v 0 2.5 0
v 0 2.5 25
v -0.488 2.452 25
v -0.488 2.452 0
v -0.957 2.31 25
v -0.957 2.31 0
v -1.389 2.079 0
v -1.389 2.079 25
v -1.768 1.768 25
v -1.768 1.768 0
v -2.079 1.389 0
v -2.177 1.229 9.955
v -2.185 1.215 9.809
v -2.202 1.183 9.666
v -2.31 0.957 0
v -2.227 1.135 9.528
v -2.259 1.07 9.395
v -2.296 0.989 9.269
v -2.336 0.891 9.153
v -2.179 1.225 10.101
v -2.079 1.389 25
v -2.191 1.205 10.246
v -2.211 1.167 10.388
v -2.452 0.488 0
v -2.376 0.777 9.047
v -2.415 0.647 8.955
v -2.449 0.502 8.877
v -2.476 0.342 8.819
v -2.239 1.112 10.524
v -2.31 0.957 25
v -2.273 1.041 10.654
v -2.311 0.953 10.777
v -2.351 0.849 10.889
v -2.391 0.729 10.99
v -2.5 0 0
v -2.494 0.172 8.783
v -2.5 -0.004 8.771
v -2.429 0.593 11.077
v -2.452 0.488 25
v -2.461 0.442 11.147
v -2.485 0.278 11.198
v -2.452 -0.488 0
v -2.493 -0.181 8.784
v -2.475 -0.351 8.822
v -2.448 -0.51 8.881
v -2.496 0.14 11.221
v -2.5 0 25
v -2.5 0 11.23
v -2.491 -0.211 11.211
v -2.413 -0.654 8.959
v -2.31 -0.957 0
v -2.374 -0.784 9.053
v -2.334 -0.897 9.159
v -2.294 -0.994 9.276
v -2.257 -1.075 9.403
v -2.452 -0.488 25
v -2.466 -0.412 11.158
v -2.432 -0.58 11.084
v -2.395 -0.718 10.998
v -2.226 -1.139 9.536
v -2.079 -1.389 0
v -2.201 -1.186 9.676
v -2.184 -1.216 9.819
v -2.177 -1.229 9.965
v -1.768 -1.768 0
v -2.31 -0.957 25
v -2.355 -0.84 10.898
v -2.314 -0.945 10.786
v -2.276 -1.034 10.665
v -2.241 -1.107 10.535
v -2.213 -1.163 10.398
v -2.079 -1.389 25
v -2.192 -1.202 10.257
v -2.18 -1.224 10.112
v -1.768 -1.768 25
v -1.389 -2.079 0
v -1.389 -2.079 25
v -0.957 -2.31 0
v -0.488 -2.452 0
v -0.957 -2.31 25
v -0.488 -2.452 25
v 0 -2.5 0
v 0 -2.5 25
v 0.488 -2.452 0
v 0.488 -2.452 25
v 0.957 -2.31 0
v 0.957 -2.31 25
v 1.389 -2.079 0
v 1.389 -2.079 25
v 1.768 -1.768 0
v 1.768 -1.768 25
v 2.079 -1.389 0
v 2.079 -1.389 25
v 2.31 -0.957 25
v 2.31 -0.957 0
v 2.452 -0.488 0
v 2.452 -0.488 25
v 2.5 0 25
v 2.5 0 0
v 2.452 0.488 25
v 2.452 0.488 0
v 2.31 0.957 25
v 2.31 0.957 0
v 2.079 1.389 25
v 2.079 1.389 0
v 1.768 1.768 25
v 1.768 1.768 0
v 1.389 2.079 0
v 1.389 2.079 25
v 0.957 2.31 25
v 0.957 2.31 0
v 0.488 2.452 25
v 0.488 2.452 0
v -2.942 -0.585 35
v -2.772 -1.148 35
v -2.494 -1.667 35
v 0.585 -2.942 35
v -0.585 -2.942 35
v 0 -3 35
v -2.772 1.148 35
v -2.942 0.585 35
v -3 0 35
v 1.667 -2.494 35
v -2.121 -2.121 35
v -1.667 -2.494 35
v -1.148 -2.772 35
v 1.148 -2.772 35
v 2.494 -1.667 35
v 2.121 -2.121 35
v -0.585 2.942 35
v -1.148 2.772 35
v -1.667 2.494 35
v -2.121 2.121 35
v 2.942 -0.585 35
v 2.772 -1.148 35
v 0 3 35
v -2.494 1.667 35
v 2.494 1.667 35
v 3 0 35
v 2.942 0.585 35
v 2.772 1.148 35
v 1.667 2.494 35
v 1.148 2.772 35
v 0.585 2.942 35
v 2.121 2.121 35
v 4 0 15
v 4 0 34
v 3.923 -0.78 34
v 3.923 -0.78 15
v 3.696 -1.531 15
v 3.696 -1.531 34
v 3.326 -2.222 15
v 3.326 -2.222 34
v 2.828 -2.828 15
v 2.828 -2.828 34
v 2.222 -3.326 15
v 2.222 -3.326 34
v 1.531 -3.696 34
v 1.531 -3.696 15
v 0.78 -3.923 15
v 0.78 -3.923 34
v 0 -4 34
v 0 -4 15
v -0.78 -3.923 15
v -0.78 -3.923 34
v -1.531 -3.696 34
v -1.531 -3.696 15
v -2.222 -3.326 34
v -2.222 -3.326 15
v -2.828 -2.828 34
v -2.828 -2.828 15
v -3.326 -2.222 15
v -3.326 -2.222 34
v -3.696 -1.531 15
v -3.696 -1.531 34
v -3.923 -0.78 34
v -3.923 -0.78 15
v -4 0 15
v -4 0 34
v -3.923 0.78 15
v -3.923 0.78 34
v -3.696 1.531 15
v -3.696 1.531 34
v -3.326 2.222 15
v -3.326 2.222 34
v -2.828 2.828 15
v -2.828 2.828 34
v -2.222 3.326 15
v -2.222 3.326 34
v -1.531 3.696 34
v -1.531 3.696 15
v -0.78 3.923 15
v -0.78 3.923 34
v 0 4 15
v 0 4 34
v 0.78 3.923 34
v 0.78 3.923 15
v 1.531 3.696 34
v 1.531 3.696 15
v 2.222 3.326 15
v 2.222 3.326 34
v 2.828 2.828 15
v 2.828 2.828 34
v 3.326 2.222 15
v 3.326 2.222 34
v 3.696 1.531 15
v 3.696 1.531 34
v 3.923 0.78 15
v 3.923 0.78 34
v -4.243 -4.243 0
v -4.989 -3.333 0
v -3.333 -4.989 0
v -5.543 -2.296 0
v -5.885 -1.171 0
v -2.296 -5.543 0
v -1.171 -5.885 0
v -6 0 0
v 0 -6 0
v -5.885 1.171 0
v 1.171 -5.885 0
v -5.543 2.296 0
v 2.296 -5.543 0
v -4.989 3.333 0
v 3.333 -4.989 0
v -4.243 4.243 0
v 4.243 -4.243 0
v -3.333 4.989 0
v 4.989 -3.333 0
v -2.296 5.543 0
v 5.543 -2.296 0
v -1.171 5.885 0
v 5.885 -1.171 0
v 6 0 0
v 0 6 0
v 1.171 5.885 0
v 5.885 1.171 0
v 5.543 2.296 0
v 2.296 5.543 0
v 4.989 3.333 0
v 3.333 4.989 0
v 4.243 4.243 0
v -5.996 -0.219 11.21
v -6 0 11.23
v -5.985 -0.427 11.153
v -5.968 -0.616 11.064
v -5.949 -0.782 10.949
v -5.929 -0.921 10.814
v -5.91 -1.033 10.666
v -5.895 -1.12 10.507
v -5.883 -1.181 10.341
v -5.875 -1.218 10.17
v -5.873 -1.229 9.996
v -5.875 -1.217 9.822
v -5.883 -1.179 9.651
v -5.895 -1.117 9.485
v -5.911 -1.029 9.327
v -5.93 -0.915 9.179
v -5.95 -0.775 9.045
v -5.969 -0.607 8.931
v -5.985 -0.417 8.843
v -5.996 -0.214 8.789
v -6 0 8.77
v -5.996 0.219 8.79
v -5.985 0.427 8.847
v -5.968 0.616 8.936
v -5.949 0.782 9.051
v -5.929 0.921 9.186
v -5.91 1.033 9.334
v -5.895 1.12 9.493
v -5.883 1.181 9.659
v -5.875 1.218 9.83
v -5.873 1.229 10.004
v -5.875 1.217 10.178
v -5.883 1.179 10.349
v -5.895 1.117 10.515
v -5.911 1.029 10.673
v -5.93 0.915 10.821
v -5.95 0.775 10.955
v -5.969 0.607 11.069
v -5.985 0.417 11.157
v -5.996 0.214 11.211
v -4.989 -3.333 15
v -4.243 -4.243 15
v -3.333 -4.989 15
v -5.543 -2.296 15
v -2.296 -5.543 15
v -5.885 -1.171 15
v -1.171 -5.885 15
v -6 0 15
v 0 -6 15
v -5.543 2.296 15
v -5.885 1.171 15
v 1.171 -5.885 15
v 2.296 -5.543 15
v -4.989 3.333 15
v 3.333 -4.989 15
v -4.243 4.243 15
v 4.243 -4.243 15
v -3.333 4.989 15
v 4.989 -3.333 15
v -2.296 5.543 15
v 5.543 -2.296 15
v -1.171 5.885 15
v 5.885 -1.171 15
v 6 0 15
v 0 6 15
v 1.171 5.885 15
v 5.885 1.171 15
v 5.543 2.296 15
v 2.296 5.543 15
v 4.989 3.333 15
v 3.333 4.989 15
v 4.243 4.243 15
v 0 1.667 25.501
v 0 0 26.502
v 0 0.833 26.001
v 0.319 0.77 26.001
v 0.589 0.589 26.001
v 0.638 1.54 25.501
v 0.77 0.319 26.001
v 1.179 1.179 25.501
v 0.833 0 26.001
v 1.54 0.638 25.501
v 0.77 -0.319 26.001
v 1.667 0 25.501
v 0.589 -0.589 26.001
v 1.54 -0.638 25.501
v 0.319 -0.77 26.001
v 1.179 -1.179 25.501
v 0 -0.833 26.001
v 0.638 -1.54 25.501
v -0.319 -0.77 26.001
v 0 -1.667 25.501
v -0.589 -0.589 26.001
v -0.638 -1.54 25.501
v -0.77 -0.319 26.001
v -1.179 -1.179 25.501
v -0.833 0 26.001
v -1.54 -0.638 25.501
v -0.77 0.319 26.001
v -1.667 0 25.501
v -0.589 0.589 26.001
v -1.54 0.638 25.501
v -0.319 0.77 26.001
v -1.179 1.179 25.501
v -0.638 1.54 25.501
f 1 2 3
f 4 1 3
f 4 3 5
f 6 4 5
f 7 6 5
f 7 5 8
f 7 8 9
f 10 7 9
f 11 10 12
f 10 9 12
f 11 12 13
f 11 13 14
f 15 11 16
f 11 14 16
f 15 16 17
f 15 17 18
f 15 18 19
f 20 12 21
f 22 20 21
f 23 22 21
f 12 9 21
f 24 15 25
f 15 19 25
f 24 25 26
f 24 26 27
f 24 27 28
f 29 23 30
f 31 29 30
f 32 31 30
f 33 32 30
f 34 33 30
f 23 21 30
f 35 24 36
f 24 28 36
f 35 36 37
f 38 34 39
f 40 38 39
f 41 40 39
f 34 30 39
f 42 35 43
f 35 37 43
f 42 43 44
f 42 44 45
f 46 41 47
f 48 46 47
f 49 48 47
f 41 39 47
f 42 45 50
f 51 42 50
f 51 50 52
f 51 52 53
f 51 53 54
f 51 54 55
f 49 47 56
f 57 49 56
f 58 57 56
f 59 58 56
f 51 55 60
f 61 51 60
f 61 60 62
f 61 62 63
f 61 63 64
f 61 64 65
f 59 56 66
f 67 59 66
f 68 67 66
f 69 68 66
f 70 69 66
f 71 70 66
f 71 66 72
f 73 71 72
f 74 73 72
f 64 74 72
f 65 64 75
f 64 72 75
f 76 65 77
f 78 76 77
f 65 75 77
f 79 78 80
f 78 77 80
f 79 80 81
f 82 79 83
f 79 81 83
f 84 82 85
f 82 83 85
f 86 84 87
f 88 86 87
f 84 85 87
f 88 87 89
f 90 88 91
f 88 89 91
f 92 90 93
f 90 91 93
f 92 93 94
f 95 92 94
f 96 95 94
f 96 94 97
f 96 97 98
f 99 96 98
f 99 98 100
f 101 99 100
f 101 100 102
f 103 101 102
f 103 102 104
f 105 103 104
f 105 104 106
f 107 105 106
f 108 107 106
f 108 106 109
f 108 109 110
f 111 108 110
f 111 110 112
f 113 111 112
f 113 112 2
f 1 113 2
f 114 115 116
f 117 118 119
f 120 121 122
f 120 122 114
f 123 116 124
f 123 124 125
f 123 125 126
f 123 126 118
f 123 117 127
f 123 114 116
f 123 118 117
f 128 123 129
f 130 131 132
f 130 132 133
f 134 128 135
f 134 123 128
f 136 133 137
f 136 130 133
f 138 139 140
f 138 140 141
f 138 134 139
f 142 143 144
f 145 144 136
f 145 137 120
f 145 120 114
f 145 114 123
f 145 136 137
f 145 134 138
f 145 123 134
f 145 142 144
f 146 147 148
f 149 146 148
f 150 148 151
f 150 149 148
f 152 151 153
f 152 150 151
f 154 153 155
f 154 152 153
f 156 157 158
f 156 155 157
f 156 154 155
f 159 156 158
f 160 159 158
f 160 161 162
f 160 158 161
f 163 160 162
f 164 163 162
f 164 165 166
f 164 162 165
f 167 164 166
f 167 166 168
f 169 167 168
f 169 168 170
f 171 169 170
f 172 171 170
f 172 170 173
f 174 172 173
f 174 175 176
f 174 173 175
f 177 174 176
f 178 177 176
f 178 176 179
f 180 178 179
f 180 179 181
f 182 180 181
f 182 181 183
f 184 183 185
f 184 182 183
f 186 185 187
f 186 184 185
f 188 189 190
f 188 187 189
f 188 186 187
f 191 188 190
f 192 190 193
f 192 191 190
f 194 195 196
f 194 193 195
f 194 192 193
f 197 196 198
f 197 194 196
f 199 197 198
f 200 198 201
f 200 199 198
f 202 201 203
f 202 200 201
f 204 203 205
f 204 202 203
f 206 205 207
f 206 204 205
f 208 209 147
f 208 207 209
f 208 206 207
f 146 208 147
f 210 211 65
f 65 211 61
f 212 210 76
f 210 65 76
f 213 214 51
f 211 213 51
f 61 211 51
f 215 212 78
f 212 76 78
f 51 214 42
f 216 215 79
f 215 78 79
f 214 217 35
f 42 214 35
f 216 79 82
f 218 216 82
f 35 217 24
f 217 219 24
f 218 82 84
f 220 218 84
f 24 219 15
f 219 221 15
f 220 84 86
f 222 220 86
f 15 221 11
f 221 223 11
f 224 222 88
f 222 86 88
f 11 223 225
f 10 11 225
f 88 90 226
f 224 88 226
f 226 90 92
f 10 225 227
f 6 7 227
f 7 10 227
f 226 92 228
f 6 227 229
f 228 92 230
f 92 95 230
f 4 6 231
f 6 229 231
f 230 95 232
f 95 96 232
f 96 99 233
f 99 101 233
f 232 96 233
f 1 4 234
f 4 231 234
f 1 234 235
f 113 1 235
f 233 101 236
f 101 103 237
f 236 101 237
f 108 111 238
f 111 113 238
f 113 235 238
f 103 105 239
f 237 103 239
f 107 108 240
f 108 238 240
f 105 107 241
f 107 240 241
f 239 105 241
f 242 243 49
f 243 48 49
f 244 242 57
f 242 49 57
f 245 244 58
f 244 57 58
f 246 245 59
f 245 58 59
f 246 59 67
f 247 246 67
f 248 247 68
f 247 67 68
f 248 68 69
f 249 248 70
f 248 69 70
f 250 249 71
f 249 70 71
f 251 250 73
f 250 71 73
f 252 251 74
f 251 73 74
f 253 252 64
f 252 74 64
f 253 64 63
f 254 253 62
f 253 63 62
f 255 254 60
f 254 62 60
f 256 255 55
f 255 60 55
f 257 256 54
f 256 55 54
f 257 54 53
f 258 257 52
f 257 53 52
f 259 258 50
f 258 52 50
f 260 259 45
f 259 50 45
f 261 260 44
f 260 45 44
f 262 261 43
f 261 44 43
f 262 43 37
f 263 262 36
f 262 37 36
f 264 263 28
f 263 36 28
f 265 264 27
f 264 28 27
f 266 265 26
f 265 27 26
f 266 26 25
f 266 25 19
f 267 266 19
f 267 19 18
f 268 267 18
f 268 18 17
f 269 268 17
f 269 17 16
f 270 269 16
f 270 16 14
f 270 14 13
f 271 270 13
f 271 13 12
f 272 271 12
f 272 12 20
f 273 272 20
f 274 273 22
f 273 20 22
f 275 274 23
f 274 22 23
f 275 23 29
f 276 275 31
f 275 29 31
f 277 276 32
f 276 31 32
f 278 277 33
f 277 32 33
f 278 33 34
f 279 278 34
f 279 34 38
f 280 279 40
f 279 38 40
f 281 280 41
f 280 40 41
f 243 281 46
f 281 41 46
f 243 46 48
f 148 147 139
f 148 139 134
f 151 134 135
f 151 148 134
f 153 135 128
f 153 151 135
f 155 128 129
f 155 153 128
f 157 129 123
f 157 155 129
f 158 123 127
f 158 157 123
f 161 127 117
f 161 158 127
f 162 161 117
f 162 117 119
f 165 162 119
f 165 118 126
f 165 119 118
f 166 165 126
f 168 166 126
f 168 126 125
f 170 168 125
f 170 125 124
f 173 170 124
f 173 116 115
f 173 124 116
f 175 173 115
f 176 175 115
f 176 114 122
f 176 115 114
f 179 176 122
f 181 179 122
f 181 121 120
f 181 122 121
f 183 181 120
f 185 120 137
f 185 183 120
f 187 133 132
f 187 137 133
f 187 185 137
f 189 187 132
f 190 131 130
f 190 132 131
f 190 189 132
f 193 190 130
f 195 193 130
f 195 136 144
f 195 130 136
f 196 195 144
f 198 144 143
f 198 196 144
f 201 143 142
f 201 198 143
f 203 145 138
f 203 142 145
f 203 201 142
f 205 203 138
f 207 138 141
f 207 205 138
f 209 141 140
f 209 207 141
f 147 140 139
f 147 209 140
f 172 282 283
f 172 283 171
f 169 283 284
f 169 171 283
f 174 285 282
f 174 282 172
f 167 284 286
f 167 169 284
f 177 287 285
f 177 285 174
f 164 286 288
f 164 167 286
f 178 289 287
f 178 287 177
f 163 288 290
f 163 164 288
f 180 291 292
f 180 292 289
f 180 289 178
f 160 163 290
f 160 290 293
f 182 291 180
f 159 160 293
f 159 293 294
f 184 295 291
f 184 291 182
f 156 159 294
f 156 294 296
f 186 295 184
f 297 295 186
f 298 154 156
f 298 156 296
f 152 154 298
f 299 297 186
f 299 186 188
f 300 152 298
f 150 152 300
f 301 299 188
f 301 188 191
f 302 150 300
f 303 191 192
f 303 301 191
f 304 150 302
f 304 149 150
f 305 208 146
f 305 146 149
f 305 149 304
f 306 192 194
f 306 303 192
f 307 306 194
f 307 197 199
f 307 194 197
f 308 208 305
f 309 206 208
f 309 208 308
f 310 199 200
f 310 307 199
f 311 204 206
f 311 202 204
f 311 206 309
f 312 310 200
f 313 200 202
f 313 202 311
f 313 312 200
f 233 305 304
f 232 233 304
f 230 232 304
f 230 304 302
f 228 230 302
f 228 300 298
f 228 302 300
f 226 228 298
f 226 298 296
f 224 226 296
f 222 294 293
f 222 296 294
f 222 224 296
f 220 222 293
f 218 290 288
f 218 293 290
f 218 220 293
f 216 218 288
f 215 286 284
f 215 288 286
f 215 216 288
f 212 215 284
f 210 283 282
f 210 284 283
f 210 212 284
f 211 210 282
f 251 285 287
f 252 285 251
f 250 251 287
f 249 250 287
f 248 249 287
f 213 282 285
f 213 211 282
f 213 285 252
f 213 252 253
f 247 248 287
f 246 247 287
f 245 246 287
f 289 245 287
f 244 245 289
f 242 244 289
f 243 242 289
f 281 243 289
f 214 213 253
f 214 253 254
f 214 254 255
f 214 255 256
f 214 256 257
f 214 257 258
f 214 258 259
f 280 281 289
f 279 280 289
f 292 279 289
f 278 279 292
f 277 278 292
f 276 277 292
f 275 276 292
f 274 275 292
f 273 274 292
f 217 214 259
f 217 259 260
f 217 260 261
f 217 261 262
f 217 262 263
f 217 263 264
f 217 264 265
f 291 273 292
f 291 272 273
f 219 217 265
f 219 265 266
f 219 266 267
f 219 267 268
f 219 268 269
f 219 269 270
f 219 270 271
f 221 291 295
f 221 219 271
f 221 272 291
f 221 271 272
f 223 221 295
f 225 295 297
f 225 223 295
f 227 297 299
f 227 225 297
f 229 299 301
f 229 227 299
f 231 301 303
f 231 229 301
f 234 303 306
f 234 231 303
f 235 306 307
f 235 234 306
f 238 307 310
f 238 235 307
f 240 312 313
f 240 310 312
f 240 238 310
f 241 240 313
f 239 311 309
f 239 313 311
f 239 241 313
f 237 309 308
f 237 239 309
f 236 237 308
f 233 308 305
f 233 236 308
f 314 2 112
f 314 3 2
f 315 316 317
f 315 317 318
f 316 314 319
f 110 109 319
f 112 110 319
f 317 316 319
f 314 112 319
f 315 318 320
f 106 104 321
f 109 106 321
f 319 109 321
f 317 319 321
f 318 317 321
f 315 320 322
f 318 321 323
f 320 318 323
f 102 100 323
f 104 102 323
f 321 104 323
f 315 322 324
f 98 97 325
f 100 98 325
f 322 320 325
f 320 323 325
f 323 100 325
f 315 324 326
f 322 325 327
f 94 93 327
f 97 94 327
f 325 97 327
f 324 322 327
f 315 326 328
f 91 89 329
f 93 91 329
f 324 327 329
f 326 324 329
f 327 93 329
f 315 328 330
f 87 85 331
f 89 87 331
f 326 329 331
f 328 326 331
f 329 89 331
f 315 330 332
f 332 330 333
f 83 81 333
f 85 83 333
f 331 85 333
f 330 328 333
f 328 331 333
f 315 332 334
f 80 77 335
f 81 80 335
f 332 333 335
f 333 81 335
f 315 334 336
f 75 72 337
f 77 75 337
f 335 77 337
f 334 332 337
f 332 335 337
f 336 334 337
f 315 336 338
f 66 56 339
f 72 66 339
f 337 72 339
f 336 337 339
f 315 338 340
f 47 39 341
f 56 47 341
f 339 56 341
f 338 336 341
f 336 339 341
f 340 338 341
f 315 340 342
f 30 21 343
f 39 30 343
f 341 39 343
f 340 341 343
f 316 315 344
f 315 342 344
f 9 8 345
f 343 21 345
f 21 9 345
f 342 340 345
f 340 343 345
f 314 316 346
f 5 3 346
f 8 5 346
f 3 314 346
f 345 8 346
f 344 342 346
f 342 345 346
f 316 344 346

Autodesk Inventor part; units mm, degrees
ref_plane "XZ Plane" through (0, 0, 0) normal (0, 1, 0) x (-1, 0, 0)
ref_plane "XY Plane" through (0, 0, 0) normal (0, 0, 1) x (1, 0, 0)
sketch "Skizze1" plane through (0, 0, 0) normal (0, 0, 1) x (1, 0, 0)
  circle A0 centre (0, 0) radius 6
  dimension "d0" = 12
extrude "Extrusion1" add sketch "Skizze1" along normal blind 15
sketch "Skizze2" plane through (0, 0, 15) normal (0, 0, 1) x (1, 0, 0)
  circle A0 centre (0, 0) radius 6 projected
  circle A1 centre (0, 0) radius 4
  dimension "d3" = 8
extrude "Extrusion2" add sketch "Skizze2" along normal blind 20 contours A1
sketch "Skizze3" plane through (0, 0, 0) normal (0, 0, -1) x (-1, 0, 0)
  circle A0 centre (0, 0) radius 6 projected
hole "Bohrung1" at (0, 0, 0) direction (0, 0, 1) diameter 5 depth 25 tip angle 118
ref_plane "Arbeitsebene1" through (-6, 0, 0) normal (1, 0, 0) x (0, 1, 0)
sketch "Skizze4" plane through (-6, 0, 0) normal (1, 0, 0) x (0, 1, 0)
  line L0 (-8.4, 0) -> (8.4, 0) projected
  line L1 (0, -3) -> (0, 18) projected
  point P0 (0, 0)
  point P1 (0, 10)
  dimension "d13" = 10
hole "Bohrung2" at (-6, 0, 10) direction (1, 0, 0) diameter 2.459 end up to surface thread size "M3x0.5" class "6H" standard "ISO Metric profile"
chamfer "Fase1" distance 1 angle 45 1 edges at (-4, 0, 35)
properties part number "13_0204_061"
